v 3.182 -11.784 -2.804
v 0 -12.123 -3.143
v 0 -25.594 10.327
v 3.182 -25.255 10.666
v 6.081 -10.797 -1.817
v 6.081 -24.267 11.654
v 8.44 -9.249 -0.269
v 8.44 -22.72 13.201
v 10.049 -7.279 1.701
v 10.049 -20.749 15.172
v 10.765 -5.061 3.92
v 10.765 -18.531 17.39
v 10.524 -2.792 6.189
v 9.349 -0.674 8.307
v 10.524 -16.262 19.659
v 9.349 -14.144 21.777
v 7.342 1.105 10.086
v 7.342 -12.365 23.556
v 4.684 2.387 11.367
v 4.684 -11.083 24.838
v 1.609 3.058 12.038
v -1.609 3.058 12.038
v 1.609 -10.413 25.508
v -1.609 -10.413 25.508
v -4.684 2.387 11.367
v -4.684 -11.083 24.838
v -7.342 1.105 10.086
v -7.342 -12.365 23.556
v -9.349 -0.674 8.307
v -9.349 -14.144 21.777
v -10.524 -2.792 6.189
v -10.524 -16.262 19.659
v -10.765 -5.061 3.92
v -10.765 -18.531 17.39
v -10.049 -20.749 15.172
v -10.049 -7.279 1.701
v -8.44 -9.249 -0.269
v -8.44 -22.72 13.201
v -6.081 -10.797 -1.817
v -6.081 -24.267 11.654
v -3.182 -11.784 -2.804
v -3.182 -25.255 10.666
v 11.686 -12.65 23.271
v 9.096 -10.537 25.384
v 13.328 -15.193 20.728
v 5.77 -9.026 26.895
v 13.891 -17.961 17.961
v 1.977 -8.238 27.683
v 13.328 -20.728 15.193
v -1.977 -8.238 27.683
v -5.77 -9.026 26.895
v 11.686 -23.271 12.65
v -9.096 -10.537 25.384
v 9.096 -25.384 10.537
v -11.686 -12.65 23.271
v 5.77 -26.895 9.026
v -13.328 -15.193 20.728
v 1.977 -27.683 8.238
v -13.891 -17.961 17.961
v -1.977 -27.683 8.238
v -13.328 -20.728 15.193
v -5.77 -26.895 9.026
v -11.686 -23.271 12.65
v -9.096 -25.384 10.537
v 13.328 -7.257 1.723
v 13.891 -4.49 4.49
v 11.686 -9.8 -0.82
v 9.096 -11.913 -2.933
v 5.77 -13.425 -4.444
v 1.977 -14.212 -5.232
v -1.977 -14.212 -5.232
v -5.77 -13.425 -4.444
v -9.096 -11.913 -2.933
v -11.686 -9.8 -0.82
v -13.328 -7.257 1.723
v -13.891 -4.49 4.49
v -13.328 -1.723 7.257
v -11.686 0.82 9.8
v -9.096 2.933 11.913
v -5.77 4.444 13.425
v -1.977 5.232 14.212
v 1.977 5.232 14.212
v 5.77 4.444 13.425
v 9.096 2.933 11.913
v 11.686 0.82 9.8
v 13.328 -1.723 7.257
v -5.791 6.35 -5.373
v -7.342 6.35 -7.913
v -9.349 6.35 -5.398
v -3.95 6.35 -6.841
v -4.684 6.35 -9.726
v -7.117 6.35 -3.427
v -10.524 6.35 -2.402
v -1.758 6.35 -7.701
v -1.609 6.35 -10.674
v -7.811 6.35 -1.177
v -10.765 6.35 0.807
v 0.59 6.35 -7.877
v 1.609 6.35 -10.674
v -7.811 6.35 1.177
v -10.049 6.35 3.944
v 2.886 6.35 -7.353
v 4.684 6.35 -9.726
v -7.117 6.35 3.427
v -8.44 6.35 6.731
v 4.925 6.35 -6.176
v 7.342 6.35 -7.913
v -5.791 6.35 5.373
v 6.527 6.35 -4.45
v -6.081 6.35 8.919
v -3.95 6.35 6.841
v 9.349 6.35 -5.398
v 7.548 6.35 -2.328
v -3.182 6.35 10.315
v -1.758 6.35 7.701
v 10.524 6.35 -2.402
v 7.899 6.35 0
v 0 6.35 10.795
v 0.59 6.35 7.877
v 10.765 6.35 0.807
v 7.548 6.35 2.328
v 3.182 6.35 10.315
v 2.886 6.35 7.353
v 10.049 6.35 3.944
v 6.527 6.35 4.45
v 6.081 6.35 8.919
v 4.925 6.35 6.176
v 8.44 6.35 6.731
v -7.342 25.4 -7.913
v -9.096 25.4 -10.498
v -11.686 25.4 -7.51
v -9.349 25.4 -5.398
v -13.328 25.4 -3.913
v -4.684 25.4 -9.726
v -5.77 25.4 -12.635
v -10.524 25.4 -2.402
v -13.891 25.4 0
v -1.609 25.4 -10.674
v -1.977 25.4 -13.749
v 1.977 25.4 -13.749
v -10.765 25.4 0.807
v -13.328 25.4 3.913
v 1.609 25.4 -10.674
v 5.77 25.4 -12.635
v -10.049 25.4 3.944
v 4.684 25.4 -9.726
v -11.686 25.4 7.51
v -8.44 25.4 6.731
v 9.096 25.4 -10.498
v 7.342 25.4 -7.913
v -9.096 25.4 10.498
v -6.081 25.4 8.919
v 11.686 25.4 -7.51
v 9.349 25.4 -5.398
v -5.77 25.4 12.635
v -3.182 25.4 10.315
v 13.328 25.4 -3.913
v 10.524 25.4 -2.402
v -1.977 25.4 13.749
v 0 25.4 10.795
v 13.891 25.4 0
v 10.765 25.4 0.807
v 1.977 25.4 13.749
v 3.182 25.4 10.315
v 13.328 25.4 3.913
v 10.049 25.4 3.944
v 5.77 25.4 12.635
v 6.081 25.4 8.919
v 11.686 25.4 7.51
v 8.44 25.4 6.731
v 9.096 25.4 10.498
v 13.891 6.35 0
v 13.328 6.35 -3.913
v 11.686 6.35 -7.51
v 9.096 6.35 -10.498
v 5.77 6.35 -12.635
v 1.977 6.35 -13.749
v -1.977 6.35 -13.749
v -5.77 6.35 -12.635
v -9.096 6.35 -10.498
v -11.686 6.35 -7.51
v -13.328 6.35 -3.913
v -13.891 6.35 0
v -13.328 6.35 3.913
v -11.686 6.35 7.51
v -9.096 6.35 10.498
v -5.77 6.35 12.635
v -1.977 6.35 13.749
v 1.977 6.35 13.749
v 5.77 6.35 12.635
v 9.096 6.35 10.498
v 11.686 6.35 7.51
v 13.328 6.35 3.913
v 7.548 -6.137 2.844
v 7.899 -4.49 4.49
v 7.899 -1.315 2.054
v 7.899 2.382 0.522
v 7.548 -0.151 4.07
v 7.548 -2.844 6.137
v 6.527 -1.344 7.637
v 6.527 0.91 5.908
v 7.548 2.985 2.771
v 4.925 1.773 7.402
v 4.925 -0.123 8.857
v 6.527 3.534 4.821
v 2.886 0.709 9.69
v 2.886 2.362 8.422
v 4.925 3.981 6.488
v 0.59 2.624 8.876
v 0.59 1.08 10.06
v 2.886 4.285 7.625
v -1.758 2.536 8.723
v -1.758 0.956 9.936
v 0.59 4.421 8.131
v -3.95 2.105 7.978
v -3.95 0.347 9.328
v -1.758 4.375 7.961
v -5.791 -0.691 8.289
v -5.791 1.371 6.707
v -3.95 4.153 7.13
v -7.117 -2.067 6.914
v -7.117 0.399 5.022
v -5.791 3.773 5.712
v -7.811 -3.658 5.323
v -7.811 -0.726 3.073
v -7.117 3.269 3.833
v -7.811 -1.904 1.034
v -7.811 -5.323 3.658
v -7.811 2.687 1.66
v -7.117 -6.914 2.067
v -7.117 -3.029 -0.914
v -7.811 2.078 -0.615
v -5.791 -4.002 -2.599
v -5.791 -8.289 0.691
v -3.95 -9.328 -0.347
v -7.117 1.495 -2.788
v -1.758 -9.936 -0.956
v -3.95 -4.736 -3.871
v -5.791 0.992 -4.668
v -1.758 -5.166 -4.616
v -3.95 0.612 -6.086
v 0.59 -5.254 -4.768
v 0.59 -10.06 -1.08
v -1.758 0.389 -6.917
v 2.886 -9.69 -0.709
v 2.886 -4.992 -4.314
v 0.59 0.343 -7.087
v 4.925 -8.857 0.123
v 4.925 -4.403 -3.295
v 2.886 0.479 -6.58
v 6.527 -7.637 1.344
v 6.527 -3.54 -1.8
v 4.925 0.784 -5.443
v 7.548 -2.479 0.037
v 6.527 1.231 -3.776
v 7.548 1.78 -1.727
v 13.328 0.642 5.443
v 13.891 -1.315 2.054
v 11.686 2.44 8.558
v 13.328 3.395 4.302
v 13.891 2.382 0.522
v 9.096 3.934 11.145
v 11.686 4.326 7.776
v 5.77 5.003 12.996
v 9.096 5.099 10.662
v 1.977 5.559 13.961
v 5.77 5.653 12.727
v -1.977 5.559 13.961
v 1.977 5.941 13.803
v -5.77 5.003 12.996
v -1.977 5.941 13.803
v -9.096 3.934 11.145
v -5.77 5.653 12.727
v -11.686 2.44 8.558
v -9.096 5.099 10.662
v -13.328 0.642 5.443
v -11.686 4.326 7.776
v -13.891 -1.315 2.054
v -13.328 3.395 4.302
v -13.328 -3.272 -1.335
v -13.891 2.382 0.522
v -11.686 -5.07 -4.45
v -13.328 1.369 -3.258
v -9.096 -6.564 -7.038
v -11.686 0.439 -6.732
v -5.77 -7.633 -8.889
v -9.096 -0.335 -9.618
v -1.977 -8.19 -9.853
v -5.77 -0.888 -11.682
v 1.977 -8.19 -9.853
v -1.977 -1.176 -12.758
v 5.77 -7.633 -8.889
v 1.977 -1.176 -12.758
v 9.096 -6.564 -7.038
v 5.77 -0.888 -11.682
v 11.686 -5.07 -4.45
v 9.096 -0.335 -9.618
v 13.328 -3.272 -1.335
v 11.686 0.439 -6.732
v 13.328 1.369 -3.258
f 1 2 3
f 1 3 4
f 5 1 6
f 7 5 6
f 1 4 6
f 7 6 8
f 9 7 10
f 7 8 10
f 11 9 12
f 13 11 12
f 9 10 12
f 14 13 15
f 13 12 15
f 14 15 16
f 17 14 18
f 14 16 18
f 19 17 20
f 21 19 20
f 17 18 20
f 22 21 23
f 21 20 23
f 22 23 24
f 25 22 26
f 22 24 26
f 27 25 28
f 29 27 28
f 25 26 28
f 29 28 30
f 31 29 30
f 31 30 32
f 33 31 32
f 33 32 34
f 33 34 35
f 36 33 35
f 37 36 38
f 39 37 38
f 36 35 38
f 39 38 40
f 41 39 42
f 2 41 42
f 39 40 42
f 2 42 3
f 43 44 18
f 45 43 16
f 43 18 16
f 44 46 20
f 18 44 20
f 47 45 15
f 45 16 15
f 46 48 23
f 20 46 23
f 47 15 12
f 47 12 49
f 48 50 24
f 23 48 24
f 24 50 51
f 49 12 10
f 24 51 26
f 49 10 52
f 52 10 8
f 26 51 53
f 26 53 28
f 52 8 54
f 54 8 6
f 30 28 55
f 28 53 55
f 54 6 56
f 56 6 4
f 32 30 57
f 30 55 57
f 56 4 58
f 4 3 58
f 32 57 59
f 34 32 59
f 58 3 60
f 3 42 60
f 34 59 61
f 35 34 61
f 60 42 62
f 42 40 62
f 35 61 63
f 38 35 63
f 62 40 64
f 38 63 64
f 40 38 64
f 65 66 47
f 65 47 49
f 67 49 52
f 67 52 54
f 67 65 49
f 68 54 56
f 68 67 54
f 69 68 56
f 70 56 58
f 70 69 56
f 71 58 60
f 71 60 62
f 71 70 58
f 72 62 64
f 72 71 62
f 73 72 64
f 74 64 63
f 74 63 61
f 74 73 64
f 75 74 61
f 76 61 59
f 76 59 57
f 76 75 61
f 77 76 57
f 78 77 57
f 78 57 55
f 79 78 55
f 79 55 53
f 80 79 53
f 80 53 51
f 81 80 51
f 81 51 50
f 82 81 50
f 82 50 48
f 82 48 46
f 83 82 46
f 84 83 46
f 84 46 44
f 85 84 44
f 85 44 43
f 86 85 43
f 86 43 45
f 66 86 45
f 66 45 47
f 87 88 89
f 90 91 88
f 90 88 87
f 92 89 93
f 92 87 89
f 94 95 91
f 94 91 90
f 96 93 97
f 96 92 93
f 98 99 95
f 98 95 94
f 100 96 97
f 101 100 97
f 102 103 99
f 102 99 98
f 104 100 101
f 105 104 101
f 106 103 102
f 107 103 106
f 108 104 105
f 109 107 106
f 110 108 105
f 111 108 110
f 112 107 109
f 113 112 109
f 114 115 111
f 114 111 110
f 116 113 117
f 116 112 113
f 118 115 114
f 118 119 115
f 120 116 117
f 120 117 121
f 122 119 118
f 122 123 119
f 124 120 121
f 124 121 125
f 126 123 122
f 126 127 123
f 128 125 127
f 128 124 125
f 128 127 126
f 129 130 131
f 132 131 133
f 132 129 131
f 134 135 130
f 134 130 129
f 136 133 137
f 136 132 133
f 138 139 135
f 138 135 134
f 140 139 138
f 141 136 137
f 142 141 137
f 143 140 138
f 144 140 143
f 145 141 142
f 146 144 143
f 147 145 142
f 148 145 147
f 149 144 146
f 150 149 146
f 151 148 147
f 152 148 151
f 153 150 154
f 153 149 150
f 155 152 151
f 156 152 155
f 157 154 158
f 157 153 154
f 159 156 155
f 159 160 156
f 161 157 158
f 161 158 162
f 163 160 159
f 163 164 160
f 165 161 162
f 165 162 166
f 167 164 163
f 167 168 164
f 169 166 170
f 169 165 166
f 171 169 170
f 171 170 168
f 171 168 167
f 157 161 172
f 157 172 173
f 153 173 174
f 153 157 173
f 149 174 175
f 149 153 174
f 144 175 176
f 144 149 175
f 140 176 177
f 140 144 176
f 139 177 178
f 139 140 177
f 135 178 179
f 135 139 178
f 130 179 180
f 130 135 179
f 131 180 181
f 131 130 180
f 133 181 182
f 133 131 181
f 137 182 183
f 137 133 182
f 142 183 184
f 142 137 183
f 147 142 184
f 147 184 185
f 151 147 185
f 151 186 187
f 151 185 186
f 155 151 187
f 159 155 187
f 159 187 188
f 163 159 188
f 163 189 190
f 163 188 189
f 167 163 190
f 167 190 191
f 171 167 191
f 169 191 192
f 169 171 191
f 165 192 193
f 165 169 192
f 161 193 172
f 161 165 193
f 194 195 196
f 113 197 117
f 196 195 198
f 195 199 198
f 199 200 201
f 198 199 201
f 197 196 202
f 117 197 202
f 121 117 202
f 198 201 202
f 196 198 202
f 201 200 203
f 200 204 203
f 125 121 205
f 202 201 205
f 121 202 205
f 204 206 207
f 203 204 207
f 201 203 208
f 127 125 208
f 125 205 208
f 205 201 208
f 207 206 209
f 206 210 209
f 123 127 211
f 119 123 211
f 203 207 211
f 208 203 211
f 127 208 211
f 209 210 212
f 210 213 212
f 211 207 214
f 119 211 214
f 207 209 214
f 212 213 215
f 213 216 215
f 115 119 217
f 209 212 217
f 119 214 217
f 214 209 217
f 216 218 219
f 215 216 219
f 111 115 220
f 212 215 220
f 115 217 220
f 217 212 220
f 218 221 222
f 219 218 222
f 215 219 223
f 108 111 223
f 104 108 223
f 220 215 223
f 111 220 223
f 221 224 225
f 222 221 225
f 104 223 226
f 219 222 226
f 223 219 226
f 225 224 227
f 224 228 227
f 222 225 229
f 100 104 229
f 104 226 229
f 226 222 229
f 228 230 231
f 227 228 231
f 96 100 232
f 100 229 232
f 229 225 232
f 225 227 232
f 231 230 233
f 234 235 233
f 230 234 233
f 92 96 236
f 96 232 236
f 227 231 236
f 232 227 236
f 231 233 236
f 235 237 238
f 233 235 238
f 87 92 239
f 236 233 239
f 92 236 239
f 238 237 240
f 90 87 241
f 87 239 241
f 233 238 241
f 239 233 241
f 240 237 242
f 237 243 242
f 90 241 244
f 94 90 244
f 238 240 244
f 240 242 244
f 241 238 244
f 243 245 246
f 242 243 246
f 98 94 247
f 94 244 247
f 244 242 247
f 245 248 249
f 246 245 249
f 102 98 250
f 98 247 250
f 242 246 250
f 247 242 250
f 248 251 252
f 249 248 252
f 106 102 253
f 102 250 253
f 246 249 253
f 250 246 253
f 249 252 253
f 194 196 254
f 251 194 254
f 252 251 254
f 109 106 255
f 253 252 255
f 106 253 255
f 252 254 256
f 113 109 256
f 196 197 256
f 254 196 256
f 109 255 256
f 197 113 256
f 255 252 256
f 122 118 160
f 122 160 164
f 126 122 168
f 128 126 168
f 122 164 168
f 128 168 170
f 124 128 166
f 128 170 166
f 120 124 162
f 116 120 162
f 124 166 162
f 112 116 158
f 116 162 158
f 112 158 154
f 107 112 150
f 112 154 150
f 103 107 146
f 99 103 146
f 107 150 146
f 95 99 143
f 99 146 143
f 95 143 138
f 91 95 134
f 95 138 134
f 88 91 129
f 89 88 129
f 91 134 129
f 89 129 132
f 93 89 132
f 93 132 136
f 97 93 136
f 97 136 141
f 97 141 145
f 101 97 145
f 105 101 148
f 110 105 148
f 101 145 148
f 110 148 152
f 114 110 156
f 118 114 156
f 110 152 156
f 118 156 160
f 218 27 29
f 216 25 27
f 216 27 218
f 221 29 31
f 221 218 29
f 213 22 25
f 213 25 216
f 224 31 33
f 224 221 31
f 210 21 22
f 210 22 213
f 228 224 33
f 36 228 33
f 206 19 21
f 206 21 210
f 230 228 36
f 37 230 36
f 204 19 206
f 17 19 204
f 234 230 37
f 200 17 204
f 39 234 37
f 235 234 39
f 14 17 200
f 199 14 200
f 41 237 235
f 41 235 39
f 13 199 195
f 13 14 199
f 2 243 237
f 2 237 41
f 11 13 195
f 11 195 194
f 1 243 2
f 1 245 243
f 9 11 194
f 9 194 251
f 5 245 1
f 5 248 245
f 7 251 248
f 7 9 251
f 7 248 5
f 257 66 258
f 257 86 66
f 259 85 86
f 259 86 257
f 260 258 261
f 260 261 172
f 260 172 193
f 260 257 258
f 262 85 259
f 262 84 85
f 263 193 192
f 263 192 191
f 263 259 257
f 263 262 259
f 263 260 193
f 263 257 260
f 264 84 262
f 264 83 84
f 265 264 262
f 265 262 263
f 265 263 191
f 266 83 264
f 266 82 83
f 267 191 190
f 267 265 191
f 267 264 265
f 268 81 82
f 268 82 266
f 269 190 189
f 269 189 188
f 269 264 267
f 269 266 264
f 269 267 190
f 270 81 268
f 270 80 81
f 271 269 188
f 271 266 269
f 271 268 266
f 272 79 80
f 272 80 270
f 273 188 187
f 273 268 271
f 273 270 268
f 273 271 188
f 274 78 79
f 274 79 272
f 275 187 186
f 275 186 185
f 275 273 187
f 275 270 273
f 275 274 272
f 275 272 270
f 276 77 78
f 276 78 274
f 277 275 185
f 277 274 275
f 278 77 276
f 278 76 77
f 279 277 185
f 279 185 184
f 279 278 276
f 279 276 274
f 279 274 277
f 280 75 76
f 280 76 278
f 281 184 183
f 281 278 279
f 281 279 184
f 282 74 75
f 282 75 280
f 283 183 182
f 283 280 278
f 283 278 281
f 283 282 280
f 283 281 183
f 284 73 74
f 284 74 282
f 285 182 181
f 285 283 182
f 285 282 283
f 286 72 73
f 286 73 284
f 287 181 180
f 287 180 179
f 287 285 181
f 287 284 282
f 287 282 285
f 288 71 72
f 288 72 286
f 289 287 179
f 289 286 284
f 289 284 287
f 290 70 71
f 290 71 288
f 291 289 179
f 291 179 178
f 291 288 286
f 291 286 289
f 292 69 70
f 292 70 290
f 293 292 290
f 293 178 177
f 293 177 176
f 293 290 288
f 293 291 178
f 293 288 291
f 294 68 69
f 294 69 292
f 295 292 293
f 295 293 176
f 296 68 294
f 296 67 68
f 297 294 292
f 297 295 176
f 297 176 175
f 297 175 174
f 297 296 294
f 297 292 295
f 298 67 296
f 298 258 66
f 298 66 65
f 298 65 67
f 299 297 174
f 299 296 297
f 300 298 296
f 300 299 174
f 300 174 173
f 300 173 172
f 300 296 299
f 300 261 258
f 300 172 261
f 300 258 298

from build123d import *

# Parameters (mm, degrees)
SKETCH3_R          = 13.890625
SKETCH3_R_2        = 7.8994
SKETCH4_R          = 10.795
CUT_EXTRUDE1_DEPTH = 19.05
SKETCH5_R          = 10.795
CUT_EXTRUDE2_DEPTH = 19.05


with BuildPart() as part:
    # Sweep1: sweep along a path in Sketch2
    with BuildLine(Plane(origin=(0, 0, 0), x_dir=(0, 0, -1), z_dir=(1, 0, 0))) as sweep1_path:
        Line((-17.960512242, -17.960512242), (-4.490128061, -4.490128061))
        ThreePointArc((-4.490128061, -4.490128061), (-1.166946263, 0.483364969), (0, 6.35))
        Line((0, 6.35), (0, 25.4))
    # Sketch3 → Sweep1 (sweep)
    with BuildSketch(Plane(origin=(0, 25.4, 0), x_dir=(1, 0, 0), z_dir=(0, 1, 0))):
        Circle(SKETCH3_R)
        Circle(SKETCH3_R_2, mode=Mode.SUBTRACT)
    sweep(path=sweep1_path.line)

    # Sketch4 → Cut-Extrude1 (cut)
    with BuildSketch(Plane(origin=(0, 25.4, 0), x_dir=(1, 0, 0), z_dir=(0, 1, 0))):
        with Locations(Location((0, 0, 0), (0, 0, 270))):
            Circle(SKETCH4_R)
    extrude(amount=-CUT_EXTRUDE1_DEPTH, mode=Mode.SUBTRACT)

    # Sketch5 → Cut-Extrude2 (cut)
    with BuildSketch(Plane(origin=(0, -17.960512242, 17.960512242), x_dir=(1, 0, 0), z_dir=(0, -0.7071067811865559, 0.7071067811865392))):
        with Locations(Location((0, 0, 0), (0, 0, 270))):
            Circle(SKETCH5_R)
    extrude(amount=-CUT_EXTRUDE2_DEPTH, mode=Mode.SUBTRACT)


solid = part.part
